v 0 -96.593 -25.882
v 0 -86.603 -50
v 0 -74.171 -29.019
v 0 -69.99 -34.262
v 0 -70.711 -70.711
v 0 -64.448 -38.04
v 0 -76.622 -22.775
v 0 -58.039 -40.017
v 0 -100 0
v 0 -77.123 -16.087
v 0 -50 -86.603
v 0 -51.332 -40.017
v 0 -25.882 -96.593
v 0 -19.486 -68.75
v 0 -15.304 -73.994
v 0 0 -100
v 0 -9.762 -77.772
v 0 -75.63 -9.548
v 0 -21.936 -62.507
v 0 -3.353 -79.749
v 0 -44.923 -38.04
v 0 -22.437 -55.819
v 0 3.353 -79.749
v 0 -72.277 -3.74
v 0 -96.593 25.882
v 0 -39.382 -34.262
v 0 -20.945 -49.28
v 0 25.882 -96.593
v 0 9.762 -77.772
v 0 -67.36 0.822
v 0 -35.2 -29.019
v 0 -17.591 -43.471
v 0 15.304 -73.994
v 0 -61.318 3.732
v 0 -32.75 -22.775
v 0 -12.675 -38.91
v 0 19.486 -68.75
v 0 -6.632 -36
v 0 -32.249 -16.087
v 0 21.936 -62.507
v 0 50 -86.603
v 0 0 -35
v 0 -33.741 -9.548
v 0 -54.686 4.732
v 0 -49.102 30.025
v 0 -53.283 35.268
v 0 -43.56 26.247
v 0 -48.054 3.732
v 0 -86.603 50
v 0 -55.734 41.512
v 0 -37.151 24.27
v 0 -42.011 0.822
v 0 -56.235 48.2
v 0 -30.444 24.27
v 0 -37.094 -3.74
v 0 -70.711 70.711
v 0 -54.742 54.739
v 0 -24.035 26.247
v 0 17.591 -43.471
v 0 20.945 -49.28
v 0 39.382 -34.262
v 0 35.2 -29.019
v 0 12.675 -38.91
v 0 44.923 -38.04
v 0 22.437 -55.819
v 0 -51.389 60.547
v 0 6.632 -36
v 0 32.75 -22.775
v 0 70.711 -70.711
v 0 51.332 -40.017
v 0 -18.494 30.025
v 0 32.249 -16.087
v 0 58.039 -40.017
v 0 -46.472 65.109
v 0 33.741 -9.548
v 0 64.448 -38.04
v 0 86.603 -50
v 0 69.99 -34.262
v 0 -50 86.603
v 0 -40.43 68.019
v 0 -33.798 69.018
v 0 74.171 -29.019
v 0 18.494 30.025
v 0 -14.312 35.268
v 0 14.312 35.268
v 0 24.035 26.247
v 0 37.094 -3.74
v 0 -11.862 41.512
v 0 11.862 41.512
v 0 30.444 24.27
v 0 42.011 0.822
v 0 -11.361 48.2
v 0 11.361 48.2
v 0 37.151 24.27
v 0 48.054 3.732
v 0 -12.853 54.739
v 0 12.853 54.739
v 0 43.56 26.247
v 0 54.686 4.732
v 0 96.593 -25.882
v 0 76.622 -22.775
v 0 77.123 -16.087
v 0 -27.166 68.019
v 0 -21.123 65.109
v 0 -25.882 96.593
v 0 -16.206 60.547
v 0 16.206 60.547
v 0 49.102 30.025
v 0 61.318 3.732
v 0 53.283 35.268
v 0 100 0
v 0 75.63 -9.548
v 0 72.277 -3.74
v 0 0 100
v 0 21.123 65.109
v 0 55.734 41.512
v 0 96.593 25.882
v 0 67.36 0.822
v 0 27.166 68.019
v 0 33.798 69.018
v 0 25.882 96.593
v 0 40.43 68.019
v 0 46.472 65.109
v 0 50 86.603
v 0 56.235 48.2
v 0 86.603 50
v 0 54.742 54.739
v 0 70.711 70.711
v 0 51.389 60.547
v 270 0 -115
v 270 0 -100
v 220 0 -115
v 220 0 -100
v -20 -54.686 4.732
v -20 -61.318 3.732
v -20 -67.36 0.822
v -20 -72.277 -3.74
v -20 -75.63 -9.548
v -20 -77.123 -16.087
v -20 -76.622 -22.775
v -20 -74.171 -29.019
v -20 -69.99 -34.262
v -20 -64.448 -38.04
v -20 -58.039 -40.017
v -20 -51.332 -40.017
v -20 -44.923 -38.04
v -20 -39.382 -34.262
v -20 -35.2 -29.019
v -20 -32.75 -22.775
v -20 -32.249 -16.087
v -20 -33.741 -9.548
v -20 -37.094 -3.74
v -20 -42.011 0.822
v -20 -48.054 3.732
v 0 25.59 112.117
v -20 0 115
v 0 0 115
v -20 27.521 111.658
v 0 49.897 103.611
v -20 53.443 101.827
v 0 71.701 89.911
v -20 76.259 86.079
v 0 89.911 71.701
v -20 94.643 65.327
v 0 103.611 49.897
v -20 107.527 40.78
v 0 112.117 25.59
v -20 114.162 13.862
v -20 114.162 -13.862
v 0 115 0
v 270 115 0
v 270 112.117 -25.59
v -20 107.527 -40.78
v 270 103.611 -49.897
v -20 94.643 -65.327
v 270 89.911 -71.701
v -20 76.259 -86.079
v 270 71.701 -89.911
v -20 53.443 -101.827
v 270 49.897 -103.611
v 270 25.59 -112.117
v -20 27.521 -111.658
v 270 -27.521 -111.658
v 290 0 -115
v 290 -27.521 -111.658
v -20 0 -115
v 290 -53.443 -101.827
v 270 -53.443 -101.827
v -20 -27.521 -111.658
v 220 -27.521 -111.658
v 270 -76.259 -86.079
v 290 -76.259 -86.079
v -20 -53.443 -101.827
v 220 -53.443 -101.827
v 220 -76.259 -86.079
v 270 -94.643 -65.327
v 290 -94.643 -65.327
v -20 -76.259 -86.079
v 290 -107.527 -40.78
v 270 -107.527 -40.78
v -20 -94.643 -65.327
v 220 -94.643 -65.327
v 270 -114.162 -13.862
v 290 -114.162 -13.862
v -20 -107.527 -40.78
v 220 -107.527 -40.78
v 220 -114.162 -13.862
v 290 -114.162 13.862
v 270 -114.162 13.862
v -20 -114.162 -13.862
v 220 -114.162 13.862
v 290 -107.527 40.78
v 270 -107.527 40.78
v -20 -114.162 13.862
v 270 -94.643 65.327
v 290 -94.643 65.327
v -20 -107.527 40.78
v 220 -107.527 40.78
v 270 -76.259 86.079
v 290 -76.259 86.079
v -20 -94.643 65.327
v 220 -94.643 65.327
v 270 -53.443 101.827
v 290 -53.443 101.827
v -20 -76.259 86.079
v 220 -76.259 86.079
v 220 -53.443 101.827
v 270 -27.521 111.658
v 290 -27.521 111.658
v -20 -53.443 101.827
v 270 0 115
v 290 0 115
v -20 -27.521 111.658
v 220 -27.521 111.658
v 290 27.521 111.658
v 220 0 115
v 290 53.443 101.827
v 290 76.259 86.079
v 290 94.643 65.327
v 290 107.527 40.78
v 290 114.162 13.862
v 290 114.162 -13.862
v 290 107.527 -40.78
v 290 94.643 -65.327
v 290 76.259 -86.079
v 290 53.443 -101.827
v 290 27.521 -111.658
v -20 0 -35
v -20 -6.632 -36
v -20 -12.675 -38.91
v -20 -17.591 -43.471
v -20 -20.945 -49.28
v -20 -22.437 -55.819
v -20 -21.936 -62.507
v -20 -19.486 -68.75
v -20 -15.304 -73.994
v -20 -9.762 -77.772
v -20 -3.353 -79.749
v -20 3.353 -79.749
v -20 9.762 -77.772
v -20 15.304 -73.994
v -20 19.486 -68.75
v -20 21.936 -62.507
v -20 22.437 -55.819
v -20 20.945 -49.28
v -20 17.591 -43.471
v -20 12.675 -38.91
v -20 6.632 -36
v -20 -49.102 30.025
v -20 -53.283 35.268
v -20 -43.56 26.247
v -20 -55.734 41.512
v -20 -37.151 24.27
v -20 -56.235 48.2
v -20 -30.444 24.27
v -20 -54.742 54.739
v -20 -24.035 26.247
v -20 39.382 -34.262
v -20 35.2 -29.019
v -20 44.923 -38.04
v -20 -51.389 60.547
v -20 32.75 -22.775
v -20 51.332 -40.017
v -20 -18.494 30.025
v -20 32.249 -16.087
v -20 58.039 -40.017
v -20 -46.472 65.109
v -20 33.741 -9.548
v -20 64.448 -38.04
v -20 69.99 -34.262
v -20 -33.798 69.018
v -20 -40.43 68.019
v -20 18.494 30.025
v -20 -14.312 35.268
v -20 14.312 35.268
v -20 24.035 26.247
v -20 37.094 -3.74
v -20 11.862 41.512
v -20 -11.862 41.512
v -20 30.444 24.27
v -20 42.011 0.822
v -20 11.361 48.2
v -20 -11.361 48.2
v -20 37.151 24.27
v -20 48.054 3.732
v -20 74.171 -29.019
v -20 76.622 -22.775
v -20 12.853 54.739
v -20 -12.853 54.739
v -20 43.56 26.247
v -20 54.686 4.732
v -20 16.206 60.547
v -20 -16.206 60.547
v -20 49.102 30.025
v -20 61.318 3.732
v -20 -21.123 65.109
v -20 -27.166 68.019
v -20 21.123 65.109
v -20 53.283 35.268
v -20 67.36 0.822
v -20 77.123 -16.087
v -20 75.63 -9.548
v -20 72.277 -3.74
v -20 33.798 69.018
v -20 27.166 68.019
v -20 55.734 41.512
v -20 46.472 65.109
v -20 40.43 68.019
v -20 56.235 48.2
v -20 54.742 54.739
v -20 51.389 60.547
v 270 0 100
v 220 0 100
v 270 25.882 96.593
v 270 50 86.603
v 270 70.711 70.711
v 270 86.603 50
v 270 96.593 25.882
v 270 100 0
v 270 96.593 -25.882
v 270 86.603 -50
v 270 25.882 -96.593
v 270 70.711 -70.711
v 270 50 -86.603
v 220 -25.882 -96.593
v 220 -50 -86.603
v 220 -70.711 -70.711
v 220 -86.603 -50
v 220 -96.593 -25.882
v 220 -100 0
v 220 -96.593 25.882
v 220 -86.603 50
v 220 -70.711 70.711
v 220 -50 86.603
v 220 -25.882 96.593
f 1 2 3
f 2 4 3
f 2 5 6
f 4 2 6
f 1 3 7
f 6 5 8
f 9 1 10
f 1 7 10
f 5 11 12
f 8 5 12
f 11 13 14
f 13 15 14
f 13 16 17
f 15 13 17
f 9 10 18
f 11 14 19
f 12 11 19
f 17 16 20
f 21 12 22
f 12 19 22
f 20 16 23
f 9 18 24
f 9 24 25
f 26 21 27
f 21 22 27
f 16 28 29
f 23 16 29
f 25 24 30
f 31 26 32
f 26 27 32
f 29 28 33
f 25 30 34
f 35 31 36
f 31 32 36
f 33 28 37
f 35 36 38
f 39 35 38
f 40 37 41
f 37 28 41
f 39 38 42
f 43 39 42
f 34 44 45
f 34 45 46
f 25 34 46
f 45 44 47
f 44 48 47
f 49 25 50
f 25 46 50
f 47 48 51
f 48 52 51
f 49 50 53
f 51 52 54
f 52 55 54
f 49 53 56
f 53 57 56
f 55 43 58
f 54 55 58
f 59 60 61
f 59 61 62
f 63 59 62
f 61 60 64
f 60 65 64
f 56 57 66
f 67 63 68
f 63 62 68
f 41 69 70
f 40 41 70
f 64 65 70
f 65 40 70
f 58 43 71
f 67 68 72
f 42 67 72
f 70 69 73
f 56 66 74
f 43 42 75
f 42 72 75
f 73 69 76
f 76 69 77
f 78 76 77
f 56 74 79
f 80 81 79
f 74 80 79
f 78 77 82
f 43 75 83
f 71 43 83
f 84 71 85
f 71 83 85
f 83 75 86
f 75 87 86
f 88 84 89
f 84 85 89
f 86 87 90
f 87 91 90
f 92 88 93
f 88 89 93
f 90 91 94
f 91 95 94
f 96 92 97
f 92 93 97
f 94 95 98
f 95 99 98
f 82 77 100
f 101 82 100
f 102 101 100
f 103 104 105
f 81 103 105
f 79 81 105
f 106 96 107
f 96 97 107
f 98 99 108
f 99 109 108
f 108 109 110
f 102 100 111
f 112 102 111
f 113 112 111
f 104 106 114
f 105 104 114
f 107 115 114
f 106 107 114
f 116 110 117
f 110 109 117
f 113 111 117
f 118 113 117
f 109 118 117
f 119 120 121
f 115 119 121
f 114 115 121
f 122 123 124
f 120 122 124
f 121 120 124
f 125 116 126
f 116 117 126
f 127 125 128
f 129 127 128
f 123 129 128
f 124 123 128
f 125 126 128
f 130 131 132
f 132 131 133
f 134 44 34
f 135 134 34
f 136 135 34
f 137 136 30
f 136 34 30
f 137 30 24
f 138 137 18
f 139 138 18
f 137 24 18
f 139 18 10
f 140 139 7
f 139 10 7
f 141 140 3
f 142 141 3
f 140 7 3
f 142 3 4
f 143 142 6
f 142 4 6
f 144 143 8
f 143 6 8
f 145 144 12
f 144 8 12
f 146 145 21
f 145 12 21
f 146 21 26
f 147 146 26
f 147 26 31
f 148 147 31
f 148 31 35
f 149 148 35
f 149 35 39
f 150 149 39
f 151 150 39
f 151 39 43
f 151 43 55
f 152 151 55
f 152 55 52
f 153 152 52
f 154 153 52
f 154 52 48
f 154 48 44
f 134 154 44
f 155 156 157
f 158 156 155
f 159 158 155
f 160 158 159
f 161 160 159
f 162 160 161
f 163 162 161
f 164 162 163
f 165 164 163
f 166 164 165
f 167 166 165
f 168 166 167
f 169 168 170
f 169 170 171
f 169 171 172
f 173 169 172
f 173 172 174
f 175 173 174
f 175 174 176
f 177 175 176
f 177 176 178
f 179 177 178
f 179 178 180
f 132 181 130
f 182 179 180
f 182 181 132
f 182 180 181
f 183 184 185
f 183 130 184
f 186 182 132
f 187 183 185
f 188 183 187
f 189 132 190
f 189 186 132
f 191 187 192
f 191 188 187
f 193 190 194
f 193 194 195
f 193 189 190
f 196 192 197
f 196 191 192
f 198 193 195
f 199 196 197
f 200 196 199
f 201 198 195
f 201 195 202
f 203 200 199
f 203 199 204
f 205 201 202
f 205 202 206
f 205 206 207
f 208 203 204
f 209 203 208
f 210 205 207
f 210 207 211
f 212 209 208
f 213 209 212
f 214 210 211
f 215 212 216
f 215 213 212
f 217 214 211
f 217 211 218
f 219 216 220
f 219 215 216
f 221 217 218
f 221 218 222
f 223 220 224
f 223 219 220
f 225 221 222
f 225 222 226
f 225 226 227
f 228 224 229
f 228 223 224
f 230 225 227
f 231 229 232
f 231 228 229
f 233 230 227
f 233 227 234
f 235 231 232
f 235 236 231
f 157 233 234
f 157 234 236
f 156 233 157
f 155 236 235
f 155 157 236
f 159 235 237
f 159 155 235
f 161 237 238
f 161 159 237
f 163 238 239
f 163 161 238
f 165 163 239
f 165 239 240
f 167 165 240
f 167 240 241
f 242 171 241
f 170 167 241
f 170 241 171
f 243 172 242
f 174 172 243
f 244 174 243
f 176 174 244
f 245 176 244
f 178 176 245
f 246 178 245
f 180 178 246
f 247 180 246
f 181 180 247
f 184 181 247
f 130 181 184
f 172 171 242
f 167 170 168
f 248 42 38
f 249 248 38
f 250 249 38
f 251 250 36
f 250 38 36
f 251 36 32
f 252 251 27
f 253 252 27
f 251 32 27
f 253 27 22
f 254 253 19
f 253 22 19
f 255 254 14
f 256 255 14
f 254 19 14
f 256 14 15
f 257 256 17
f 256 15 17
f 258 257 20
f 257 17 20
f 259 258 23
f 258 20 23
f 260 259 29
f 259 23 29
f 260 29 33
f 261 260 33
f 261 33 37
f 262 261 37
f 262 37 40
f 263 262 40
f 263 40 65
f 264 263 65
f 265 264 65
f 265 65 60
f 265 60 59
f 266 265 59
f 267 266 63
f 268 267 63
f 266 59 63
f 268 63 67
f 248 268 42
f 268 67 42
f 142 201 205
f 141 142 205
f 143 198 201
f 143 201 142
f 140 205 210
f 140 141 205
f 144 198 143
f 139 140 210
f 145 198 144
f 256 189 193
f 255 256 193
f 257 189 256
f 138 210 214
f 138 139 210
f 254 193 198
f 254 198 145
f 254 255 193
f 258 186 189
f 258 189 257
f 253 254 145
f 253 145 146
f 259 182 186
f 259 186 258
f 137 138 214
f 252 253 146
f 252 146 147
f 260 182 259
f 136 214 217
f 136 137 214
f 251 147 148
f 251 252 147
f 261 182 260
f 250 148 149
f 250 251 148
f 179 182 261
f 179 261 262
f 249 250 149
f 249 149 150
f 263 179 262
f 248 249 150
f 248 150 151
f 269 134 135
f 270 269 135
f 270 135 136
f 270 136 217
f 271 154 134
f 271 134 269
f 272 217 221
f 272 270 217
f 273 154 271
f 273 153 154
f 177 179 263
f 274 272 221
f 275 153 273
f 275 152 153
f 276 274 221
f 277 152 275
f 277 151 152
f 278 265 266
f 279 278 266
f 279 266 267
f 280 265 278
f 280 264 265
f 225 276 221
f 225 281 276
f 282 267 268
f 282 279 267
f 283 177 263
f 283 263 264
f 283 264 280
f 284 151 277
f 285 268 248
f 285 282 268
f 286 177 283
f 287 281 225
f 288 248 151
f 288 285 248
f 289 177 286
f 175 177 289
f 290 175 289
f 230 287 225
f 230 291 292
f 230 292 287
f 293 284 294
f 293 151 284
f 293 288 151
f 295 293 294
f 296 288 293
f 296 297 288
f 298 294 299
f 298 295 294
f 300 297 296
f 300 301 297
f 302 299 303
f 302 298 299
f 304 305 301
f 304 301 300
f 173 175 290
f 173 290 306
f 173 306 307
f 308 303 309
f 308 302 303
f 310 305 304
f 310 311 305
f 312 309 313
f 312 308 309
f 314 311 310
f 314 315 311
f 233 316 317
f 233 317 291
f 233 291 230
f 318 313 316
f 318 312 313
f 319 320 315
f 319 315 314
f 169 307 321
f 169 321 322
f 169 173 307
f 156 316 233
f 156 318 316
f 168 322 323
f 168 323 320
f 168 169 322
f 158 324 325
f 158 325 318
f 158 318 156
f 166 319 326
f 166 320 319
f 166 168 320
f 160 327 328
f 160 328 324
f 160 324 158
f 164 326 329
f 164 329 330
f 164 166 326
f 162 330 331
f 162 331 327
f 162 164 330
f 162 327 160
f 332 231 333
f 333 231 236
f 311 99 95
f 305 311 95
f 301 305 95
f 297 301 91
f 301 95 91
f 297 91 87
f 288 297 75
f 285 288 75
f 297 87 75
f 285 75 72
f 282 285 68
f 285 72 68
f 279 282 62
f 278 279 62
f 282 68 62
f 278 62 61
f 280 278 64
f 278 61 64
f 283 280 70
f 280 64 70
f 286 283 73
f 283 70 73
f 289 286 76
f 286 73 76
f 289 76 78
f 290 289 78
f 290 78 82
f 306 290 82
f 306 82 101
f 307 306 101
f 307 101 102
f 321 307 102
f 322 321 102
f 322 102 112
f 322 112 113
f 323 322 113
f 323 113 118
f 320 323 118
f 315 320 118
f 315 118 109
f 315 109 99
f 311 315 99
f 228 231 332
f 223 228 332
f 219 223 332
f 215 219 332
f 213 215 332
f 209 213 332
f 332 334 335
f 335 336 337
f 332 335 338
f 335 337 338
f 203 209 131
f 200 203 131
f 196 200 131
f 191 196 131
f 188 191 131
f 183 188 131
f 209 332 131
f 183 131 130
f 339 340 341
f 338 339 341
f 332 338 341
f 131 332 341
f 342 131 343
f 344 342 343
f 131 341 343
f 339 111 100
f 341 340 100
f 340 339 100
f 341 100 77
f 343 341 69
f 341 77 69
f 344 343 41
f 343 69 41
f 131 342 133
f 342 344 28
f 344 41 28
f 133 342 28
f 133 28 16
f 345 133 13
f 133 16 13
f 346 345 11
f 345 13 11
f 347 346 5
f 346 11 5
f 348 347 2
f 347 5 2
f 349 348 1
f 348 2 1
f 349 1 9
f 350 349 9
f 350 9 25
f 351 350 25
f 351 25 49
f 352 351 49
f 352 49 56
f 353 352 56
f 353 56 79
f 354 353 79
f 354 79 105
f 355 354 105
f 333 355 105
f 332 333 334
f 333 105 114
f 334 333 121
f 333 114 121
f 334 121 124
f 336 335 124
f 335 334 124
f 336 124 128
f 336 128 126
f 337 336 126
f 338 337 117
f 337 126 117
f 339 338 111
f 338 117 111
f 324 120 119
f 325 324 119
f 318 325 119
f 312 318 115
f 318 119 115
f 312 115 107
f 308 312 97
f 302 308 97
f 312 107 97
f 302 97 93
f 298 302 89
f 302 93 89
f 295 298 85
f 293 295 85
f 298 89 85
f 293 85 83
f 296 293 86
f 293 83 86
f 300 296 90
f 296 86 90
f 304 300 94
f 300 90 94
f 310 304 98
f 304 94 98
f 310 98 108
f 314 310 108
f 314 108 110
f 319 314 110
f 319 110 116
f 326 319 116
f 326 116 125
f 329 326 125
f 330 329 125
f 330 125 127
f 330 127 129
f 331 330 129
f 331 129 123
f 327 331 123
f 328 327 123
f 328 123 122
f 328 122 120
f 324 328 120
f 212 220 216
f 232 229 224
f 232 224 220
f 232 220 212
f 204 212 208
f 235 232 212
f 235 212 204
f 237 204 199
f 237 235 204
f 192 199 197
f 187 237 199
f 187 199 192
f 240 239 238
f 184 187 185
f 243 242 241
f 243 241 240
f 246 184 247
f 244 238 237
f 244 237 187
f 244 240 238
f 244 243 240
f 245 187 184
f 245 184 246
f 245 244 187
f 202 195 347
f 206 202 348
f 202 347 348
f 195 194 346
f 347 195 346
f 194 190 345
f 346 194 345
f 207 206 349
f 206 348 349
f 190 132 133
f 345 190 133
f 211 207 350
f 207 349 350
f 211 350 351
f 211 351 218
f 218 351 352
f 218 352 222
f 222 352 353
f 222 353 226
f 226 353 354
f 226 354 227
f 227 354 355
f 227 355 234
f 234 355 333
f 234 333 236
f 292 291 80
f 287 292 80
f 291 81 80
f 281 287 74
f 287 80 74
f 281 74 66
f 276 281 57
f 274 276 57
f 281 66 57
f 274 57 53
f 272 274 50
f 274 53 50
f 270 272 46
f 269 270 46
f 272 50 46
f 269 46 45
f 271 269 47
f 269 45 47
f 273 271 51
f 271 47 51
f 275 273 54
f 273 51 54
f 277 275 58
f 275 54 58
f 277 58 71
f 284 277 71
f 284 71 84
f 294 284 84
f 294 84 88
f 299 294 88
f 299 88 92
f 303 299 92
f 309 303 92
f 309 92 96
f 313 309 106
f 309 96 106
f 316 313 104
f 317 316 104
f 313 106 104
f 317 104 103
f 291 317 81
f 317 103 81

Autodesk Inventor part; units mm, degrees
ref_plane "YZ Plane" through (0, 0, 0) normal (1, 0, 0) x (0, 1, 0)
ref_plane "XZ Plane" through (0, 0, 0) normal (0, 1, 0) x (-1, 0, 0)
ref_plane "XY Plane" through (0, 0, 0) normal (0, 0, 1) x (1, 0, 0)
sketch "Esquisse1" plane through (0, 0, 0) normal (1, 0, 0) x (0, 1, 0)
  circle A0 centre (0, 0) radius 115
  circle A1 centre (0, 0) radius 100
  dimension "d0" = 230
  dimension "d1" = 200
extrude "Extrusion1" add sketch "Esquisse1" along normal blind 270
sketch "Esquisse2" plane through (0, 0, 0) normal (0, 1, 0) x (-1, 0, 0)
  line L0 (-270, 115) -> (-270, -115) projected
  line L1 (0, -115) -> (-270, -115) projected
  line L2 (-270, -115) -> (-220, -115)
  line L3 (-220, -115) -> (-220, 115)
  line L4 (-220, 115) -> (-270, 115)
  line L5 (-270, 115) -> (-270, -115)
  point P0 (0, 0)
  point P1 (-270, 0)
  point P2 (-245, -115)
  dimension "d4" = 230
  dimension "d5" = 50
extrude "Extrusion2" cut sketch "Esquisse2" against normal blind 270
sketch "Esquisse3" plane through (0, 0, 0) normal (-1, 0, 0) x (0, 0, 1)
  circle A0 centre (0, 0) radius 115
  circle A1 centre (0, 0) radius 115 projected
  dimension "d8" = 0
extrude "Extrusion3" add sketch "Esquisse3" along normal blind 20
sketch "Esquisse4" plane through (0, 0, 0) normal (1, 0, 0) x (0, 0, -1)
  circle A0 centre (0, 0) radius 115
  dimension "d11" = 230
sketch "Esquisse5" plane through (270, 0, 0) normal (1, 0, 0) x (0, 0, -1)
  circle A0 centre (0, 0) radius 115
  dimension "d12" = 230
extrude "Extrusion4" add sketch "Esquisse5" along normal blind 20
sketch "Esquisse6" plane through (-20, 0, 0) normal (-1, 0, 0) x (0, 0, 1)
  circle A0 centre (0, 0) radius 115 projected
  line L0 (93.037, 67.5953) -> (0, 0)
  line L1 (0, 0) -> (93.037, -67.5953)
  line L2 (0, 0) -> (-35.537, -109.3715)
  arc A1 (-115, 0) -> (115, 0) centre (0, 0) ccw projected
  line L3 (0, 0) -> (-115, 0)
  line L4 (-100, 0) -> (-115, 0) projected
  line L5 (0, 0) -> (-35.537, 109.3715)
  circle A2 centre (-57.5, 0) radius 22.5
  circle A3 centre (-17.7685, 54.6857) radius 22.5
  circle A4 centre (46.5185, 33.7977) radius 22.5
  circle A5 centre (46.5185, -33.7977) radius 22.5
  circle A6 centre (-17.7685, -54.6857) radius 22.5
  dimension "d15" = 72
  dimension "d16" = 72
  dimension "d17" = 72
  dimension "d18" = 72
  dimension "d19" = 45
  dimension "d20" = 45
  dimension "d21" = 45
  dimension "d22" = 45
  dimension "d23" = 45
hole "Perçage1" at (-20, 54.6857, -17.7685) at (-20, 33.7977, 46.5185) at (-20, -33.7977, 46.5185) at (-20, -54.6857, -17.7685) at (-20, 0, -57.5) direction (1, 0, 0) diameter 45 depth 40 tip angle 118
properties part number "socle"
